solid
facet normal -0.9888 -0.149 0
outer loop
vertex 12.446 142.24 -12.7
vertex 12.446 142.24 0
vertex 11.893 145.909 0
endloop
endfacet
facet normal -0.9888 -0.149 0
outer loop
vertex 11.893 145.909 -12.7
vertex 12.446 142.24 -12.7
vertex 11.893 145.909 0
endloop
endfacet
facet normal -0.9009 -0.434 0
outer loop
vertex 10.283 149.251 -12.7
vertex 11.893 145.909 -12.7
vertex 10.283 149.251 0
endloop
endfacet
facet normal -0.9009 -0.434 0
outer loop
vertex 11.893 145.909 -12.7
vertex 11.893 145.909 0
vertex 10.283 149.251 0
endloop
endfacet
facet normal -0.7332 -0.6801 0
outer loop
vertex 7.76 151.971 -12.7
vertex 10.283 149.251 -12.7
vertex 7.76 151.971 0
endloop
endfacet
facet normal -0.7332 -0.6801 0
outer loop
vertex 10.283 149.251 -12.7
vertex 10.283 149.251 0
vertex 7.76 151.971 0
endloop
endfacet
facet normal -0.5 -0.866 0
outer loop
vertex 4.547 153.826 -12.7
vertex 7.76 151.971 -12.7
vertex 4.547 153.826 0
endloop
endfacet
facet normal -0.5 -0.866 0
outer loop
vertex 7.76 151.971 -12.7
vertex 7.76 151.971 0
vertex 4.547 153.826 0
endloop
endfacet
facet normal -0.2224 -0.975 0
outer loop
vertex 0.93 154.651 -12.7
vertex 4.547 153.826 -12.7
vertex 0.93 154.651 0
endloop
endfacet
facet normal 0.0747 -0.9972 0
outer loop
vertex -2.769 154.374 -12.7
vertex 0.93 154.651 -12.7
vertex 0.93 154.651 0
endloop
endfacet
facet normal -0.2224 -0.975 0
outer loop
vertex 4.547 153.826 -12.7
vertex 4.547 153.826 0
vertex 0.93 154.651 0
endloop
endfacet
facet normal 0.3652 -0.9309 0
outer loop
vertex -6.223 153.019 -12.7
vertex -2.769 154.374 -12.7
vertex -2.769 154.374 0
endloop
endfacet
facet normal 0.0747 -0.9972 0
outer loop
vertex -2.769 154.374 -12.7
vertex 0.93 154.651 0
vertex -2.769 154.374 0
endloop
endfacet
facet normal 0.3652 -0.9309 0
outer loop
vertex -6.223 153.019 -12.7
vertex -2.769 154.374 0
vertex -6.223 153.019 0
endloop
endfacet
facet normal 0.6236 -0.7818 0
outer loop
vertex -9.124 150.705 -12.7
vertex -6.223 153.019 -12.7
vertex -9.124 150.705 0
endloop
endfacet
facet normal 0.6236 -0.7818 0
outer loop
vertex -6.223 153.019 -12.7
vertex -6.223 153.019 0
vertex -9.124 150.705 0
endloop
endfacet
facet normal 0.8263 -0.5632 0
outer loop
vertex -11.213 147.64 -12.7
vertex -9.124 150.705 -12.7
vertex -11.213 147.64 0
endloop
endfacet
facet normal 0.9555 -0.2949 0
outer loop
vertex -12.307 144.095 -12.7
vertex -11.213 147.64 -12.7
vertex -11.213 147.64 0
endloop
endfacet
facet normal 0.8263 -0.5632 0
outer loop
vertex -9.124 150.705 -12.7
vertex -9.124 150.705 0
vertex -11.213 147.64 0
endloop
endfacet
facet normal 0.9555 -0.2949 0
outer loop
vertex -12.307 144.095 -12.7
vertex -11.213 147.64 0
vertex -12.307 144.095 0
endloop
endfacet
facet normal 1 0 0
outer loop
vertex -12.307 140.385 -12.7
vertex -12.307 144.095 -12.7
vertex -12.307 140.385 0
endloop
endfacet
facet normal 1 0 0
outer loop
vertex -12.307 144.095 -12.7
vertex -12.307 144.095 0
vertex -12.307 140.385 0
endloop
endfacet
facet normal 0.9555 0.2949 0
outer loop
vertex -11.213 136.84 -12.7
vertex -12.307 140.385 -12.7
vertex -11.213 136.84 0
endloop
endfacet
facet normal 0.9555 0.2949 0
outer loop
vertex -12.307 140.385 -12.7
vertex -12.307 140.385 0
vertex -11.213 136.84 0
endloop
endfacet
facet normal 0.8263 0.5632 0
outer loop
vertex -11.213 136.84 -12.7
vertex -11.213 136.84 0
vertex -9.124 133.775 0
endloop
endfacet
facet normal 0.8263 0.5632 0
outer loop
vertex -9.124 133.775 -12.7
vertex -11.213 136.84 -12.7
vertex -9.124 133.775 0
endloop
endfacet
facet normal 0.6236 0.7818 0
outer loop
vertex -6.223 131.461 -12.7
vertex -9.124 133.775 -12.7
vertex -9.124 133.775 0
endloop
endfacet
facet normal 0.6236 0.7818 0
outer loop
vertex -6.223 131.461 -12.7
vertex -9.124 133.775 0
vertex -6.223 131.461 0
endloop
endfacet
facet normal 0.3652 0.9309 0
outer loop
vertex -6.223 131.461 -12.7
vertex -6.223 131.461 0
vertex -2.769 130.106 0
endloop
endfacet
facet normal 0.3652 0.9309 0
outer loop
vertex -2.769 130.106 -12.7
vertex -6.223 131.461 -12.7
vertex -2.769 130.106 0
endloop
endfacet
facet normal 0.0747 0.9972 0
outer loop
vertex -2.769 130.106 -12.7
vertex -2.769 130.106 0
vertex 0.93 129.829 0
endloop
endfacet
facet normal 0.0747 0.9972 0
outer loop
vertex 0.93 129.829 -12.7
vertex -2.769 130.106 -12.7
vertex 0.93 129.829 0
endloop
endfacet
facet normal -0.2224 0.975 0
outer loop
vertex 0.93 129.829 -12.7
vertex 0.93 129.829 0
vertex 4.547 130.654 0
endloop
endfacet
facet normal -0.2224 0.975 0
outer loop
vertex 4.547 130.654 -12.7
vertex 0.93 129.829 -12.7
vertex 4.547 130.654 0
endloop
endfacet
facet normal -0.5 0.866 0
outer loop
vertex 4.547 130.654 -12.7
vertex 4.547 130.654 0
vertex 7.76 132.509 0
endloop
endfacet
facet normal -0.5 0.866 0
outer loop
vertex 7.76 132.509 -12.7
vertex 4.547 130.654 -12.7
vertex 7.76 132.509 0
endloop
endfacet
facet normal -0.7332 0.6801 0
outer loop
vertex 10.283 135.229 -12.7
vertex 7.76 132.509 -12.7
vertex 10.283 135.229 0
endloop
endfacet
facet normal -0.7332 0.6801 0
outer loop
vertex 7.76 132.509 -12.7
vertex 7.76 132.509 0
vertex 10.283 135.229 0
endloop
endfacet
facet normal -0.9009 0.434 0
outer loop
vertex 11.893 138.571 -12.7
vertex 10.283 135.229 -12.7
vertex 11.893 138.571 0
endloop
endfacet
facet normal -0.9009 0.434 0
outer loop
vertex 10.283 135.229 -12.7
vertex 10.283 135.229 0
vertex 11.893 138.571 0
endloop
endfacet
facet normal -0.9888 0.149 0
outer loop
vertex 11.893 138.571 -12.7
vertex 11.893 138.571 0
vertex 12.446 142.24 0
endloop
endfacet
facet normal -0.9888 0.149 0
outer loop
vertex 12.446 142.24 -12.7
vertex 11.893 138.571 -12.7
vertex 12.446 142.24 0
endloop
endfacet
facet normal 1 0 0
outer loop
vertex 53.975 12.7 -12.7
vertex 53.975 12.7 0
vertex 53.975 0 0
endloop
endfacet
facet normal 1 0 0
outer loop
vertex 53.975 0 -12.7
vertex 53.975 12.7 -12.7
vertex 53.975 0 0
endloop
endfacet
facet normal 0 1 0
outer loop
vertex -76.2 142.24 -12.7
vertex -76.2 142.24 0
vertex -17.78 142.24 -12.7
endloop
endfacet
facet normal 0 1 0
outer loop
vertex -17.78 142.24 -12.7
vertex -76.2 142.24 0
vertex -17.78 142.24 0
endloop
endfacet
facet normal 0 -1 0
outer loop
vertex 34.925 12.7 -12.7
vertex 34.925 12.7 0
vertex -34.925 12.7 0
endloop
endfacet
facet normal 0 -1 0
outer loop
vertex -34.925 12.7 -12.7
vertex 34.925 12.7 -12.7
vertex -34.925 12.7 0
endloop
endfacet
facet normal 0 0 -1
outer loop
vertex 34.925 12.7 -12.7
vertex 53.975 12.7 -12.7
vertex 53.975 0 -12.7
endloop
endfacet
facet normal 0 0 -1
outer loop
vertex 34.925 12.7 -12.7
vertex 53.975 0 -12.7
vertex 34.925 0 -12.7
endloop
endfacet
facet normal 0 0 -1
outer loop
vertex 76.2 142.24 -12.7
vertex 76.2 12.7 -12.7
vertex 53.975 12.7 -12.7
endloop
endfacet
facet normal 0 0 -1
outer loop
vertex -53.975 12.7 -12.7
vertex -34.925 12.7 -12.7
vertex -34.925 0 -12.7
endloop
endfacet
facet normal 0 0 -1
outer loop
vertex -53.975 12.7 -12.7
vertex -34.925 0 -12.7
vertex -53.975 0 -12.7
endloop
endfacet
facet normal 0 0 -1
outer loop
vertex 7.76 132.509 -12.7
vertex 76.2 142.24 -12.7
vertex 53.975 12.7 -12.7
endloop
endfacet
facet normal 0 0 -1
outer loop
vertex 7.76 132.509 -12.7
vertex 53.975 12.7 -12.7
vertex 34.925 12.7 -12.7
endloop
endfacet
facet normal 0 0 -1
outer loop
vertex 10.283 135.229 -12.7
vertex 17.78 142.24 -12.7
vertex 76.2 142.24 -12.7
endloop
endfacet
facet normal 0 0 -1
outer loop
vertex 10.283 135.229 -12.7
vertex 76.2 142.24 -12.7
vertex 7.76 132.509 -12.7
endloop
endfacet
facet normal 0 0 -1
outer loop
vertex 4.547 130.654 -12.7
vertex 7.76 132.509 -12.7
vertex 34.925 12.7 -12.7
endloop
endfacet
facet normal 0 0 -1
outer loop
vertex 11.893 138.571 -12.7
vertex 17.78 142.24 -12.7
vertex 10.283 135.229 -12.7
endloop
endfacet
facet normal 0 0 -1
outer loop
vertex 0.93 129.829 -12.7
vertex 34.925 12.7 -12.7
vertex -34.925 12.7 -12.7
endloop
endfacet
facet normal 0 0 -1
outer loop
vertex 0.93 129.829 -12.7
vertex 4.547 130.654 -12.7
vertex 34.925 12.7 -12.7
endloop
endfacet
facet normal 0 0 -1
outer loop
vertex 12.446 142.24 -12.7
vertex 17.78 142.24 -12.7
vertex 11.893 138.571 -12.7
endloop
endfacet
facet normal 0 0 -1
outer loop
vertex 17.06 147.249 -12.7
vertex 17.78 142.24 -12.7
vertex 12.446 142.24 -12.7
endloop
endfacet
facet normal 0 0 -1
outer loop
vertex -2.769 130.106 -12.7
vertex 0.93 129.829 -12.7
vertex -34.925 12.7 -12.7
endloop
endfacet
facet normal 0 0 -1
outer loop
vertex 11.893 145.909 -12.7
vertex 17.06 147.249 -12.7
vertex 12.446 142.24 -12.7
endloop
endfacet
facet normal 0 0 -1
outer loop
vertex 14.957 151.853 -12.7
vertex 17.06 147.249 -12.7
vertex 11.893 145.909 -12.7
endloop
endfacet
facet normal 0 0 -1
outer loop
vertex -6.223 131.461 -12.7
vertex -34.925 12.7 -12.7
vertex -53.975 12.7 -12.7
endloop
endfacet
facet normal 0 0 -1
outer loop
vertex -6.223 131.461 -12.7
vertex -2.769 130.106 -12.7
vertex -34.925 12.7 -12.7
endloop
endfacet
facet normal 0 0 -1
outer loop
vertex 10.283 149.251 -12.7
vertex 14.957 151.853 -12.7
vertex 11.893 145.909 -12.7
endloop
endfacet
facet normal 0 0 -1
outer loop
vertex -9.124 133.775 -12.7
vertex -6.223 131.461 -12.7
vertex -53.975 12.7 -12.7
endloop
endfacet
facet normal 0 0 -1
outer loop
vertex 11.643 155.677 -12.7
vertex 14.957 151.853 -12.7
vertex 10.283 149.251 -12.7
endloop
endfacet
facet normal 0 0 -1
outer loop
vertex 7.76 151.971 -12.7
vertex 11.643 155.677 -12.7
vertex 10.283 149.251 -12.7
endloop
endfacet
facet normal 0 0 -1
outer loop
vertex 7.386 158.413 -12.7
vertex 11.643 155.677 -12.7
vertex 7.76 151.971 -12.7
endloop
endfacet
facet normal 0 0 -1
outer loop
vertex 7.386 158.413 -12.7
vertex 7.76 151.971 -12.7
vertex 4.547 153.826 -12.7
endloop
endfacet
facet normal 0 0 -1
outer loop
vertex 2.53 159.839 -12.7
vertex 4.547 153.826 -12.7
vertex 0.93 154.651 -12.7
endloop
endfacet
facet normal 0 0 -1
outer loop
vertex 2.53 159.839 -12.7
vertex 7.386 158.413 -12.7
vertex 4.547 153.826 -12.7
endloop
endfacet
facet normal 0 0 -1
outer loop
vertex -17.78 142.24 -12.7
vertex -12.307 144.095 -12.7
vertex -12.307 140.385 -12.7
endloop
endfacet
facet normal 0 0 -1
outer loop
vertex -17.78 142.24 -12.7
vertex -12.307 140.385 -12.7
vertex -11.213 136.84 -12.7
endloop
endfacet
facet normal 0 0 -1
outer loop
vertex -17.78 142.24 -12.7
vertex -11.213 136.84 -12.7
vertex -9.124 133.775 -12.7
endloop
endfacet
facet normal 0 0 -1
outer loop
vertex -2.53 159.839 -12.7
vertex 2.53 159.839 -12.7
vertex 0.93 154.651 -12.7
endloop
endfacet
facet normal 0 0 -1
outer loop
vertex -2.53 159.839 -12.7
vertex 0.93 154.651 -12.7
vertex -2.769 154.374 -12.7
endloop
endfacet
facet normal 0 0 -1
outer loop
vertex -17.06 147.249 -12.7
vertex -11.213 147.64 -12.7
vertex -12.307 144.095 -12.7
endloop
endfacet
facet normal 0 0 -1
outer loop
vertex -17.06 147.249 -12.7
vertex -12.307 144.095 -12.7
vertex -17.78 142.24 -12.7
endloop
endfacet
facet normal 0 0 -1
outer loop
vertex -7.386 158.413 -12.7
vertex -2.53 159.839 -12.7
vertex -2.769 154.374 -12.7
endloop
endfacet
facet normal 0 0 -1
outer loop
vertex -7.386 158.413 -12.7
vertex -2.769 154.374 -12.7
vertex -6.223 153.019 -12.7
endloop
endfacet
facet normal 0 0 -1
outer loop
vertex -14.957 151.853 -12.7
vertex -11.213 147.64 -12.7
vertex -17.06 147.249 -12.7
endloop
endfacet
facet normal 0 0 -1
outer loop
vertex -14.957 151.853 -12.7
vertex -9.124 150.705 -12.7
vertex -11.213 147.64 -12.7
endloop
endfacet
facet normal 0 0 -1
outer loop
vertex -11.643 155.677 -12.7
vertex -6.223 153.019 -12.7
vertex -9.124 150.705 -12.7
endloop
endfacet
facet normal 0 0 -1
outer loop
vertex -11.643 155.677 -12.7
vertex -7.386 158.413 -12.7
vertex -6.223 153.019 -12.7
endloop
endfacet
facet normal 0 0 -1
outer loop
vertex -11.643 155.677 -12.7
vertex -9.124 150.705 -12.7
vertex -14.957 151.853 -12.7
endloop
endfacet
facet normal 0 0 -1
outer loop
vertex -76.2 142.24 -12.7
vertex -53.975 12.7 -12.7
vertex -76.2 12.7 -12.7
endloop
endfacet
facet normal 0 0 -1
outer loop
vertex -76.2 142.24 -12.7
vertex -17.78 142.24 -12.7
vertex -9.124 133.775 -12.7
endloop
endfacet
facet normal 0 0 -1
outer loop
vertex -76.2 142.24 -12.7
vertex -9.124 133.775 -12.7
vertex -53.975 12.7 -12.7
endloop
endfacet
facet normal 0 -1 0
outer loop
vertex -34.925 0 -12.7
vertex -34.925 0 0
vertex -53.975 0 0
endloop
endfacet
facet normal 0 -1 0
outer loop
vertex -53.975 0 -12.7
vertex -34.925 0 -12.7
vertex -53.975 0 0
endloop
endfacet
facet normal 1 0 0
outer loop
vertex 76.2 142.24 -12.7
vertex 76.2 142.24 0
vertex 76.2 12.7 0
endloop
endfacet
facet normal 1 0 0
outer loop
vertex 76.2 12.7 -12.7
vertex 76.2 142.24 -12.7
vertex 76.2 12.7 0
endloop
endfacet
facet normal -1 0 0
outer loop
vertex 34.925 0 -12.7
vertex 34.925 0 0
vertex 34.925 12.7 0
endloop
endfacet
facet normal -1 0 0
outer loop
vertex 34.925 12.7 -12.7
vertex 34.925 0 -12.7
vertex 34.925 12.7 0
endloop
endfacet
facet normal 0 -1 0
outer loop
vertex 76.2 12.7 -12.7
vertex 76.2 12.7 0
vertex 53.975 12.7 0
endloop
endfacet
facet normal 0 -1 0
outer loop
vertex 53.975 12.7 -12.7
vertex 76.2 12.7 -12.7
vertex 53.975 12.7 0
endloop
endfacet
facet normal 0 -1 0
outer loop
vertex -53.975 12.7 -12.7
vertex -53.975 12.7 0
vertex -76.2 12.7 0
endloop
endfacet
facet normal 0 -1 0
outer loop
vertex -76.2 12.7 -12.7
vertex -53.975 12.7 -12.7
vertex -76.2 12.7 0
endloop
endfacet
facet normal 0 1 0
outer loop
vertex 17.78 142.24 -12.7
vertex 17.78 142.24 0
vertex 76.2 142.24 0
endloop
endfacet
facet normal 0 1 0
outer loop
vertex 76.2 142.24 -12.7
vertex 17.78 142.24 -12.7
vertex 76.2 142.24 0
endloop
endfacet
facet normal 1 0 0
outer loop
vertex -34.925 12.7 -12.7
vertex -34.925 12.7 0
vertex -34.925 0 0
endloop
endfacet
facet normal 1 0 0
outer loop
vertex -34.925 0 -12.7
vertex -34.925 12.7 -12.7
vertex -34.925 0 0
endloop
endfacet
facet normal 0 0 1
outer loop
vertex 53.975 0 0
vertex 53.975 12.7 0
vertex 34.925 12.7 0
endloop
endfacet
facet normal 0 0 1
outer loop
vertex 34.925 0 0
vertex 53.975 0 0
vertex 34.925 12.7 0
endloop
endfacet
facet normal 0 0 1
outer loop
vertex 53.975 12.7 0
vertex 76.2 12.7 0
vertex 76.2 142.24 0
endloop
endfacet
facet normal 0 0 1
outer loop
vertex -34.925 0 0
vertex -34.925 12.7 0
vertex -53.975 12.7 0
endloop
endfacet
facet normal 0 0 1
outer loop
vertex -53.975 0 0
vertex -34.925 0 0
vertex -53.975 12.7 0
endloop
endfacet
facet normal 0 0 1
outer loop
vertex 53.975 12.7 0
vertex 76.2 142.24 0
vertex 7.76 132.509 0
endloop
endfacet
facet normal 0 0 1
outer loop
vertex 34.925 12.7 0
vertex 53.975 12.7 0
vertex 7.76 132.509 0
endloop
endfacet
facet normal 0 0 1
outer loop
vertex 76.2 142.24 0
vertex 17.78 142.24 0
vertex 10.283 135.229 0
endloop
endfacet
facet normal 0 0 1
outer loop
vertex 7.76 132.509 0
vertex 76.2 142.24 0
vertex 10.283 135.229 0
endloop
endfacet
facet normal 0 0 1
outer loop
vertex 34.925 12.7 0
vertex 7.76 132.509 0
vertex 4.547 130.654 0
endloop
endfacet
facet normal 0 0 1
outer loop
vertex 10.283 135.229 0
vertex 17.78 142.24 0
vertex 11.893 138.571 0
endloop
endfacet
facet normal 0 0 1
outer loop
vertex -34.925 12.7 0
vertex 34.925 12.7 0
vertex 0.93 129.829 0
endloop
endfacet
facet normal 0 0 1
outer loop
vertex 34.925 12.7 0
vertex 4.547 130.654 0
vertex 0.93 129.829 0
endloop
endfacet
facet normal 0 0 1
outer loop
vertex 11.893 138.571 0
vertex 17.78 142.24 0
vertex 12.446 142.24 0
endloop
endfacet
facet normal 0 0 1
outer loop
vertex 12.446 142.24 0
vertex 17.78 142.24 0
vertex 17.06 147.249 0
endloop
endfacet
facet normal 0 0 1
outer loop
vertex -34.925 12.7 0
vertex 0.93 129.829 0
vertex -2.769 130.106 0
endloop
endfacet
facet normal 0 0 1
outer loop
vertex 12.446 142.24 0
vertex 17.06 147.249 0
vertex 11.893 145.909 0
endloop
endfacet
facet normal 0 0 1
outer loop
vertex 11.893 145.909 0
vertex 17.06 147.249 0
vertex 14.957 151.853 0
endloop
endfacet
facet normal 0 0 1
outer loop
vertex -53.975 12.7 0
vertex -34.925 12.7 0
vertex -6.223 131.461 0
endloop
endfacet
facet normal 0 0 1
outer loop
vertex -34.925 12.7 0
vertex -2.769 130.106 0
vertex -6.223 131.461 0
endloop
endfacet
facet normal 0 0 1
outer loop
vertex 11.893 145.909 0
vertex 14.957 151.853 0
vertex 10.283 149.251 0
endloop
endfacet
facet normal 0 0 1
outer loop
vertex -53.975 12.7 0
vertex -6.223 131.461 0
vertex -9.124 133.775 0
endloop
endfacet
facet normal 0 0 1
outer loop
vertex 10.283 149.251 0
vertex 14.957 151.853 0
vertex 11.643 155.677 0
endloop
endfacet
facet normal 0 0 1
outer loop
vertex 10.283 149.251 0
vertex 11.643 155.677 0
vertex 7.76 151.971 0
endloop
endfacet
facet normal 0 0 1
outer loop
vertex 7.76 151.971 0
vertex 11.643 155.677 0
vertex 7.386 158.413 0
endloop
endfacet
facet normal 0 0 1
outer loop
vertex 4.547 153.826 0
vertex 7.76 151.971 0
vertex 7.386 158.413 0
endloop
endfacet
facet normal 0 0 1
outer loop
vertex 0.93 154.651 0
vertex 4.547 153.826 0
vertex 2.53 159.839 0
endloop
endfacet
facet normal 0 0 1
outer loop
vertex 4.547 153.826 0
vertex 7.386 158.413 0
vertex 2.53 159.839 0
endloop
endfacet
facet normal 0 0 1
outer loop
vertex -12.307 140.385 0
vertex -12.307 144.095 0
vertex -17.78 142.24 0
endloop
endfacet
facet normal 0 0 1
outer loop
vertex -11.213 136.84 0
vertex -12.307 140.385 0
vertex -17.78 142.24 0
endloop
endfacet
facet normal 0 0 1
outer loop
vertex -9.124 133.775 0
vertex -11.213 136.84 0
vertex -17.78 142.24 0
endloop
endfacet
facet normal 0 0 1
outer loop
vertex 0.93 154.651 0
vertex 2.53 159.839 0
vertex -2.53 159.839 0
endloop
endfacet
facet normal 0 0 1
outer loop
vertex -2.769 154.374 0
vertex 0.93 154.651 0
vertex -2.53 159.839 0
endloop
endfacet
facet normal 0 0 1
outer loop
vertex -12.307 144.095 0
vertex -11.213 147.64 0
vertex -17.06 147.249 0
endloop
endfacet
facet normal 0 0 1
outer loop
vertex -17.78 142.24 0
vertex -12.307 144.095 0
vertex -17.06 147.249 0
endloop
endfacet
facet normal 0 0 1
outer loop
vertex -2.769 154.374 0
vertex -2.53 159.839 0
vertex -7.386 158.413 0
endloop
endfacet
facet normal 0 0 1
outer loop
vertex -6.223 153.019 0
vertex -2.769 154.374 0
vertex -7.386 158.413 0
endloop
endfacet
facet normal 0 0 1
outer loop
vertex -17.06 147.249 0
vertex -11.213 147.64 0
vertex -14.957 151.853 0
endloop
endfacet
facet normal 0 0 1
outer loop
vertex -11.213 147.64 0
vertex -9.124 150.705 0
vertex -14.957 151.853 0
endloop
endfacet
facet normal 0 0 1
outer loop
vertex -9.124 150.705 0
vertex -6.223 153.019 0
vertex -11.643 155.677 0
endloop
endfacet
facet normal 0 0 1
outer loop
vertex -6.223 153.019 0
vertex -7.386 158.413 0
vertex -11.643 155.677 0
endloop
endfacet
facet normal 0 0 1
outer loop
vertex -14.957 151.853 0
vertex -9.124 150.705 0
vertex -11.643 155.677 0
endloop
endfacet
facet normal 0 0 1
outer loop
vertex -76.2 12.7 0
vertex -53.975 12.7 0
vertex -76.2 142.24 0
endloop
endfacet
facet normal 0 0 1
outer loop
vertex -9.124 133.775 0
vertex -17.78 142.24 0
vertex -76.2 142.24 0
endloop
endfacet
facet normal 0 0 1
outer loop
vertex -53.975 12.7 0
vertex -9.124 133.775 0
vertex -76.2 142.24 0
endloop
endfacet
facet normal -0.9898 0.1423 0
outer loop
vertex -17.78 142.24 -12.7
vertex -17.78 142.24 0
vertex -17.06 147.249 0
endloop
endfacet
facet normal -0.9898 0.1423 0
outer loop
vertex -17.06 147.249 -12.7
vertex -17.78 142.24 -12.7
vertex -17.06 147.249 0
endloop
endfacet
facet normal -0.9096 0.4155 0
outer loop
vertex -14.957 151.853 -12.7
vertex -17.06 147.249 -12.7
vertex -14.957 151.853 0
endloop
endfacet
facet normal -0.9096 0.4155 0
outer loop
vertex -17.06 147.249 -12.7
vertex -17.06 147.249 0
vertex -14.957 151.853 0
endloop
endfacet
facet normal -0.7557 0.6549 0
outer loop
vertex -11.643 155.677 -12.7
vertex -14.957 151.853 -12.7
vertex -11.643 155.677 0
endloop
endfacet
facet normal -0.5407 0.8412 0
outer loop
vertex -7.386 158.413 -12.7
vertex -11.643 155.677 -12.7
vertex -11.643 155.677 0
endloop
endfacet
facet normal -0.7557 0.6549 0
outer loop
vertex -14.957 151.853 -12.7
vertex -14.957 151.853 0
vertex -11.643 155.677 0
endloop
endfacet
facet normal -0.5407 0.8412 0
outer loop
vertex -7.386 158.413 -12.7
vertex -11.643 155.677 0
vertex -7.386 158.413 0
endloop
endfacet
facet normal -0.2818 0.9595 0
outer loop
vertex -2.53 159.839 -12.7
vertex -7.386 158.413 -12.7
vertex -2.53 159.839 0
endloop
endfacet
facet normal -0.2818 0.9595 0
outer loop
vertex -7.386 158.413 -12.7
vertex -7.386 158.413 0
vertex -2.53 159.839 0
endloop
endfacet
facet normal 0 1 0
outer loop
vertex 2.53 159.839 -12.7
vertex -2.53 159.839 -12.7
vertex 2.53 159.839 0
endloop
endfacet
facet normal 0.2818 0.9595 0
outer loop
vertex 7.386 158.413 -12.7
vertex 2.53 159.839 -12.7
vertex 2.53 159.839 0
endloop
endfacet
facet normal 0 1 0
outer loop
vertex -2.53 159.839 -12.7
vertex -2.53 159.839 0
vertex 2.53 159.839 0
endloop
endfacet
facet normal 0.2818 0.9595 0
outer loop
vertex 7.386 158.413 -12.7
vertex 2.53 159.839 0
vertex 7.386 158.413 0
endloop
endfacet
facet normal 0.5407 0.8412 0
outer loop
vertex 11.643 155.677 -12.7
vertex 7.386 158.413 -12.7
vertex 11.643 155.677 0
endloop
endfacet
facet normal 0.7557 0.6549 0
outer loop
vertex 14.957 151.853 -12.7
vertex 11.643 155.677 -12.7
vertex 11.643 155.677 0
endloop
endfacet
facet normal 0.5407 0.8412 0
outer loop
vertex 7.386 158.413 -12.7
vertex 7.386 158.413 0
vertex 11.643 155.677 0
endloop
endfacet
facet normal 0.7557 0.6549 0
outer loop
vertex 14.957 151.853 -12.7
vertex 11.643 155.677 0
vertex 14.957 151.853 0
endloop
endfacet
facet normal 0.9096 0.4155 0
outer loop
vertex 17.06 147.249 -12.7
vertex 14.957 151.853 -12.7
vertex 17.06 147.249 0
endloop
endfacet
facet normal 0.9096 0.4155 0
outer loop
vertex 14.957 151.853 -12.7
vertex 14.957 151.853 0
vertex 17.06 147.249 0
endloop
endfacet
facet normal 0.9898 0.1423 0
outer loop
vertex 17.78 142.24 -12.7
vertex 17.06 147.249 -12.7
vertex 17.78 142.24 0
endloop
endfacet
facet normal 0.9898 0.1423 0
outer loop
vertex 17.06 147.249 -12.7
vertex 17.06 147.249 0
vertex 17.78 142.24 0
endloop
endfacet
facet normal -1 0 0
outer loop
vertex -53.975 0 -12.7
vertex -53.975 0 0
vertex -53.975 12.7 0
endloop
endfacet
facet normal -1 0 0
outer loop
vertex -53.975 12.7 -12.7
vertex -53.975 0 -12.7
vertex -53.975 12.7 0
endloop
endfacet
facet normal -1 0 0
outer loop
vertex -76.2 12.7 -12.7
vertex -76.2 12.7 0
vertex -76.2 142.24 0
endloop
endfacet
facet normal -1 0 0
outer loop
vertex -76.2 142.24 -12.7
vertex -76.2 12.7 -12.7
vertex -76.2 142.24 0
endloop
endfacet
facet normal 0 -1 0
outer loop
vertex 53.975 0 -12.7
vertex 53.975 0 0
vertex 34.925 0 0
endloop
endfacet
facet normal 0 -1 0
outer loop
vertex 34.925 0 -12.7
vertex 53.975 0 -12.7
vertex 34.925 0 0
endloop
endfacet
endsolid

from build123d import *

# Parameters (mm, degrees)
SKETCH1_R      = 12.446
EXTRUDE1_DEPTH = 12.7


with BuildPart() as part:
    # Sketch1 → Extrude1 (new body)
    with BuildSketch(Plane.XY):
        with BuildLine():
            Line((-76.2, 142.24), (-17.78, 142.24))
            ThreePointArc((-17.78, 142.24), (0, 160.02), (17.78, 142.24))
            Line((17.78, 142.24), (76.2, 142.24))
            Line((76.2, 142.24), (76.2, 12.7))
            Line((76.2, 12.7), (53.975, 12.7))
            Line((53.975, 12.7), (53.975, 0))
            Line((53.975, 0), (34.925, 0))
            Line((34.925, 0), (34.925, 12.7))
            Line((34.925, 12.7), (-34.925, 12.7))
            Line((-34.925, 12.7), (-34.925, 0))
            Line((-34.925, 0), (-53.975, 0))
            Line((-53.975, 0), (-53.975, 12.7))
            Line((-53.975, 12.7), (-76.2, 12.7))
            Line((-76.2, 12.7), (-76.2, 142.24))
        make_face()
        with Locations((0, 142.24)):
            Circle(SKETCH1_R, mode=Mode.SUBTRACT)
    extrude(amount=-EXTRUDE1_DEPTH)


solid = part.part
